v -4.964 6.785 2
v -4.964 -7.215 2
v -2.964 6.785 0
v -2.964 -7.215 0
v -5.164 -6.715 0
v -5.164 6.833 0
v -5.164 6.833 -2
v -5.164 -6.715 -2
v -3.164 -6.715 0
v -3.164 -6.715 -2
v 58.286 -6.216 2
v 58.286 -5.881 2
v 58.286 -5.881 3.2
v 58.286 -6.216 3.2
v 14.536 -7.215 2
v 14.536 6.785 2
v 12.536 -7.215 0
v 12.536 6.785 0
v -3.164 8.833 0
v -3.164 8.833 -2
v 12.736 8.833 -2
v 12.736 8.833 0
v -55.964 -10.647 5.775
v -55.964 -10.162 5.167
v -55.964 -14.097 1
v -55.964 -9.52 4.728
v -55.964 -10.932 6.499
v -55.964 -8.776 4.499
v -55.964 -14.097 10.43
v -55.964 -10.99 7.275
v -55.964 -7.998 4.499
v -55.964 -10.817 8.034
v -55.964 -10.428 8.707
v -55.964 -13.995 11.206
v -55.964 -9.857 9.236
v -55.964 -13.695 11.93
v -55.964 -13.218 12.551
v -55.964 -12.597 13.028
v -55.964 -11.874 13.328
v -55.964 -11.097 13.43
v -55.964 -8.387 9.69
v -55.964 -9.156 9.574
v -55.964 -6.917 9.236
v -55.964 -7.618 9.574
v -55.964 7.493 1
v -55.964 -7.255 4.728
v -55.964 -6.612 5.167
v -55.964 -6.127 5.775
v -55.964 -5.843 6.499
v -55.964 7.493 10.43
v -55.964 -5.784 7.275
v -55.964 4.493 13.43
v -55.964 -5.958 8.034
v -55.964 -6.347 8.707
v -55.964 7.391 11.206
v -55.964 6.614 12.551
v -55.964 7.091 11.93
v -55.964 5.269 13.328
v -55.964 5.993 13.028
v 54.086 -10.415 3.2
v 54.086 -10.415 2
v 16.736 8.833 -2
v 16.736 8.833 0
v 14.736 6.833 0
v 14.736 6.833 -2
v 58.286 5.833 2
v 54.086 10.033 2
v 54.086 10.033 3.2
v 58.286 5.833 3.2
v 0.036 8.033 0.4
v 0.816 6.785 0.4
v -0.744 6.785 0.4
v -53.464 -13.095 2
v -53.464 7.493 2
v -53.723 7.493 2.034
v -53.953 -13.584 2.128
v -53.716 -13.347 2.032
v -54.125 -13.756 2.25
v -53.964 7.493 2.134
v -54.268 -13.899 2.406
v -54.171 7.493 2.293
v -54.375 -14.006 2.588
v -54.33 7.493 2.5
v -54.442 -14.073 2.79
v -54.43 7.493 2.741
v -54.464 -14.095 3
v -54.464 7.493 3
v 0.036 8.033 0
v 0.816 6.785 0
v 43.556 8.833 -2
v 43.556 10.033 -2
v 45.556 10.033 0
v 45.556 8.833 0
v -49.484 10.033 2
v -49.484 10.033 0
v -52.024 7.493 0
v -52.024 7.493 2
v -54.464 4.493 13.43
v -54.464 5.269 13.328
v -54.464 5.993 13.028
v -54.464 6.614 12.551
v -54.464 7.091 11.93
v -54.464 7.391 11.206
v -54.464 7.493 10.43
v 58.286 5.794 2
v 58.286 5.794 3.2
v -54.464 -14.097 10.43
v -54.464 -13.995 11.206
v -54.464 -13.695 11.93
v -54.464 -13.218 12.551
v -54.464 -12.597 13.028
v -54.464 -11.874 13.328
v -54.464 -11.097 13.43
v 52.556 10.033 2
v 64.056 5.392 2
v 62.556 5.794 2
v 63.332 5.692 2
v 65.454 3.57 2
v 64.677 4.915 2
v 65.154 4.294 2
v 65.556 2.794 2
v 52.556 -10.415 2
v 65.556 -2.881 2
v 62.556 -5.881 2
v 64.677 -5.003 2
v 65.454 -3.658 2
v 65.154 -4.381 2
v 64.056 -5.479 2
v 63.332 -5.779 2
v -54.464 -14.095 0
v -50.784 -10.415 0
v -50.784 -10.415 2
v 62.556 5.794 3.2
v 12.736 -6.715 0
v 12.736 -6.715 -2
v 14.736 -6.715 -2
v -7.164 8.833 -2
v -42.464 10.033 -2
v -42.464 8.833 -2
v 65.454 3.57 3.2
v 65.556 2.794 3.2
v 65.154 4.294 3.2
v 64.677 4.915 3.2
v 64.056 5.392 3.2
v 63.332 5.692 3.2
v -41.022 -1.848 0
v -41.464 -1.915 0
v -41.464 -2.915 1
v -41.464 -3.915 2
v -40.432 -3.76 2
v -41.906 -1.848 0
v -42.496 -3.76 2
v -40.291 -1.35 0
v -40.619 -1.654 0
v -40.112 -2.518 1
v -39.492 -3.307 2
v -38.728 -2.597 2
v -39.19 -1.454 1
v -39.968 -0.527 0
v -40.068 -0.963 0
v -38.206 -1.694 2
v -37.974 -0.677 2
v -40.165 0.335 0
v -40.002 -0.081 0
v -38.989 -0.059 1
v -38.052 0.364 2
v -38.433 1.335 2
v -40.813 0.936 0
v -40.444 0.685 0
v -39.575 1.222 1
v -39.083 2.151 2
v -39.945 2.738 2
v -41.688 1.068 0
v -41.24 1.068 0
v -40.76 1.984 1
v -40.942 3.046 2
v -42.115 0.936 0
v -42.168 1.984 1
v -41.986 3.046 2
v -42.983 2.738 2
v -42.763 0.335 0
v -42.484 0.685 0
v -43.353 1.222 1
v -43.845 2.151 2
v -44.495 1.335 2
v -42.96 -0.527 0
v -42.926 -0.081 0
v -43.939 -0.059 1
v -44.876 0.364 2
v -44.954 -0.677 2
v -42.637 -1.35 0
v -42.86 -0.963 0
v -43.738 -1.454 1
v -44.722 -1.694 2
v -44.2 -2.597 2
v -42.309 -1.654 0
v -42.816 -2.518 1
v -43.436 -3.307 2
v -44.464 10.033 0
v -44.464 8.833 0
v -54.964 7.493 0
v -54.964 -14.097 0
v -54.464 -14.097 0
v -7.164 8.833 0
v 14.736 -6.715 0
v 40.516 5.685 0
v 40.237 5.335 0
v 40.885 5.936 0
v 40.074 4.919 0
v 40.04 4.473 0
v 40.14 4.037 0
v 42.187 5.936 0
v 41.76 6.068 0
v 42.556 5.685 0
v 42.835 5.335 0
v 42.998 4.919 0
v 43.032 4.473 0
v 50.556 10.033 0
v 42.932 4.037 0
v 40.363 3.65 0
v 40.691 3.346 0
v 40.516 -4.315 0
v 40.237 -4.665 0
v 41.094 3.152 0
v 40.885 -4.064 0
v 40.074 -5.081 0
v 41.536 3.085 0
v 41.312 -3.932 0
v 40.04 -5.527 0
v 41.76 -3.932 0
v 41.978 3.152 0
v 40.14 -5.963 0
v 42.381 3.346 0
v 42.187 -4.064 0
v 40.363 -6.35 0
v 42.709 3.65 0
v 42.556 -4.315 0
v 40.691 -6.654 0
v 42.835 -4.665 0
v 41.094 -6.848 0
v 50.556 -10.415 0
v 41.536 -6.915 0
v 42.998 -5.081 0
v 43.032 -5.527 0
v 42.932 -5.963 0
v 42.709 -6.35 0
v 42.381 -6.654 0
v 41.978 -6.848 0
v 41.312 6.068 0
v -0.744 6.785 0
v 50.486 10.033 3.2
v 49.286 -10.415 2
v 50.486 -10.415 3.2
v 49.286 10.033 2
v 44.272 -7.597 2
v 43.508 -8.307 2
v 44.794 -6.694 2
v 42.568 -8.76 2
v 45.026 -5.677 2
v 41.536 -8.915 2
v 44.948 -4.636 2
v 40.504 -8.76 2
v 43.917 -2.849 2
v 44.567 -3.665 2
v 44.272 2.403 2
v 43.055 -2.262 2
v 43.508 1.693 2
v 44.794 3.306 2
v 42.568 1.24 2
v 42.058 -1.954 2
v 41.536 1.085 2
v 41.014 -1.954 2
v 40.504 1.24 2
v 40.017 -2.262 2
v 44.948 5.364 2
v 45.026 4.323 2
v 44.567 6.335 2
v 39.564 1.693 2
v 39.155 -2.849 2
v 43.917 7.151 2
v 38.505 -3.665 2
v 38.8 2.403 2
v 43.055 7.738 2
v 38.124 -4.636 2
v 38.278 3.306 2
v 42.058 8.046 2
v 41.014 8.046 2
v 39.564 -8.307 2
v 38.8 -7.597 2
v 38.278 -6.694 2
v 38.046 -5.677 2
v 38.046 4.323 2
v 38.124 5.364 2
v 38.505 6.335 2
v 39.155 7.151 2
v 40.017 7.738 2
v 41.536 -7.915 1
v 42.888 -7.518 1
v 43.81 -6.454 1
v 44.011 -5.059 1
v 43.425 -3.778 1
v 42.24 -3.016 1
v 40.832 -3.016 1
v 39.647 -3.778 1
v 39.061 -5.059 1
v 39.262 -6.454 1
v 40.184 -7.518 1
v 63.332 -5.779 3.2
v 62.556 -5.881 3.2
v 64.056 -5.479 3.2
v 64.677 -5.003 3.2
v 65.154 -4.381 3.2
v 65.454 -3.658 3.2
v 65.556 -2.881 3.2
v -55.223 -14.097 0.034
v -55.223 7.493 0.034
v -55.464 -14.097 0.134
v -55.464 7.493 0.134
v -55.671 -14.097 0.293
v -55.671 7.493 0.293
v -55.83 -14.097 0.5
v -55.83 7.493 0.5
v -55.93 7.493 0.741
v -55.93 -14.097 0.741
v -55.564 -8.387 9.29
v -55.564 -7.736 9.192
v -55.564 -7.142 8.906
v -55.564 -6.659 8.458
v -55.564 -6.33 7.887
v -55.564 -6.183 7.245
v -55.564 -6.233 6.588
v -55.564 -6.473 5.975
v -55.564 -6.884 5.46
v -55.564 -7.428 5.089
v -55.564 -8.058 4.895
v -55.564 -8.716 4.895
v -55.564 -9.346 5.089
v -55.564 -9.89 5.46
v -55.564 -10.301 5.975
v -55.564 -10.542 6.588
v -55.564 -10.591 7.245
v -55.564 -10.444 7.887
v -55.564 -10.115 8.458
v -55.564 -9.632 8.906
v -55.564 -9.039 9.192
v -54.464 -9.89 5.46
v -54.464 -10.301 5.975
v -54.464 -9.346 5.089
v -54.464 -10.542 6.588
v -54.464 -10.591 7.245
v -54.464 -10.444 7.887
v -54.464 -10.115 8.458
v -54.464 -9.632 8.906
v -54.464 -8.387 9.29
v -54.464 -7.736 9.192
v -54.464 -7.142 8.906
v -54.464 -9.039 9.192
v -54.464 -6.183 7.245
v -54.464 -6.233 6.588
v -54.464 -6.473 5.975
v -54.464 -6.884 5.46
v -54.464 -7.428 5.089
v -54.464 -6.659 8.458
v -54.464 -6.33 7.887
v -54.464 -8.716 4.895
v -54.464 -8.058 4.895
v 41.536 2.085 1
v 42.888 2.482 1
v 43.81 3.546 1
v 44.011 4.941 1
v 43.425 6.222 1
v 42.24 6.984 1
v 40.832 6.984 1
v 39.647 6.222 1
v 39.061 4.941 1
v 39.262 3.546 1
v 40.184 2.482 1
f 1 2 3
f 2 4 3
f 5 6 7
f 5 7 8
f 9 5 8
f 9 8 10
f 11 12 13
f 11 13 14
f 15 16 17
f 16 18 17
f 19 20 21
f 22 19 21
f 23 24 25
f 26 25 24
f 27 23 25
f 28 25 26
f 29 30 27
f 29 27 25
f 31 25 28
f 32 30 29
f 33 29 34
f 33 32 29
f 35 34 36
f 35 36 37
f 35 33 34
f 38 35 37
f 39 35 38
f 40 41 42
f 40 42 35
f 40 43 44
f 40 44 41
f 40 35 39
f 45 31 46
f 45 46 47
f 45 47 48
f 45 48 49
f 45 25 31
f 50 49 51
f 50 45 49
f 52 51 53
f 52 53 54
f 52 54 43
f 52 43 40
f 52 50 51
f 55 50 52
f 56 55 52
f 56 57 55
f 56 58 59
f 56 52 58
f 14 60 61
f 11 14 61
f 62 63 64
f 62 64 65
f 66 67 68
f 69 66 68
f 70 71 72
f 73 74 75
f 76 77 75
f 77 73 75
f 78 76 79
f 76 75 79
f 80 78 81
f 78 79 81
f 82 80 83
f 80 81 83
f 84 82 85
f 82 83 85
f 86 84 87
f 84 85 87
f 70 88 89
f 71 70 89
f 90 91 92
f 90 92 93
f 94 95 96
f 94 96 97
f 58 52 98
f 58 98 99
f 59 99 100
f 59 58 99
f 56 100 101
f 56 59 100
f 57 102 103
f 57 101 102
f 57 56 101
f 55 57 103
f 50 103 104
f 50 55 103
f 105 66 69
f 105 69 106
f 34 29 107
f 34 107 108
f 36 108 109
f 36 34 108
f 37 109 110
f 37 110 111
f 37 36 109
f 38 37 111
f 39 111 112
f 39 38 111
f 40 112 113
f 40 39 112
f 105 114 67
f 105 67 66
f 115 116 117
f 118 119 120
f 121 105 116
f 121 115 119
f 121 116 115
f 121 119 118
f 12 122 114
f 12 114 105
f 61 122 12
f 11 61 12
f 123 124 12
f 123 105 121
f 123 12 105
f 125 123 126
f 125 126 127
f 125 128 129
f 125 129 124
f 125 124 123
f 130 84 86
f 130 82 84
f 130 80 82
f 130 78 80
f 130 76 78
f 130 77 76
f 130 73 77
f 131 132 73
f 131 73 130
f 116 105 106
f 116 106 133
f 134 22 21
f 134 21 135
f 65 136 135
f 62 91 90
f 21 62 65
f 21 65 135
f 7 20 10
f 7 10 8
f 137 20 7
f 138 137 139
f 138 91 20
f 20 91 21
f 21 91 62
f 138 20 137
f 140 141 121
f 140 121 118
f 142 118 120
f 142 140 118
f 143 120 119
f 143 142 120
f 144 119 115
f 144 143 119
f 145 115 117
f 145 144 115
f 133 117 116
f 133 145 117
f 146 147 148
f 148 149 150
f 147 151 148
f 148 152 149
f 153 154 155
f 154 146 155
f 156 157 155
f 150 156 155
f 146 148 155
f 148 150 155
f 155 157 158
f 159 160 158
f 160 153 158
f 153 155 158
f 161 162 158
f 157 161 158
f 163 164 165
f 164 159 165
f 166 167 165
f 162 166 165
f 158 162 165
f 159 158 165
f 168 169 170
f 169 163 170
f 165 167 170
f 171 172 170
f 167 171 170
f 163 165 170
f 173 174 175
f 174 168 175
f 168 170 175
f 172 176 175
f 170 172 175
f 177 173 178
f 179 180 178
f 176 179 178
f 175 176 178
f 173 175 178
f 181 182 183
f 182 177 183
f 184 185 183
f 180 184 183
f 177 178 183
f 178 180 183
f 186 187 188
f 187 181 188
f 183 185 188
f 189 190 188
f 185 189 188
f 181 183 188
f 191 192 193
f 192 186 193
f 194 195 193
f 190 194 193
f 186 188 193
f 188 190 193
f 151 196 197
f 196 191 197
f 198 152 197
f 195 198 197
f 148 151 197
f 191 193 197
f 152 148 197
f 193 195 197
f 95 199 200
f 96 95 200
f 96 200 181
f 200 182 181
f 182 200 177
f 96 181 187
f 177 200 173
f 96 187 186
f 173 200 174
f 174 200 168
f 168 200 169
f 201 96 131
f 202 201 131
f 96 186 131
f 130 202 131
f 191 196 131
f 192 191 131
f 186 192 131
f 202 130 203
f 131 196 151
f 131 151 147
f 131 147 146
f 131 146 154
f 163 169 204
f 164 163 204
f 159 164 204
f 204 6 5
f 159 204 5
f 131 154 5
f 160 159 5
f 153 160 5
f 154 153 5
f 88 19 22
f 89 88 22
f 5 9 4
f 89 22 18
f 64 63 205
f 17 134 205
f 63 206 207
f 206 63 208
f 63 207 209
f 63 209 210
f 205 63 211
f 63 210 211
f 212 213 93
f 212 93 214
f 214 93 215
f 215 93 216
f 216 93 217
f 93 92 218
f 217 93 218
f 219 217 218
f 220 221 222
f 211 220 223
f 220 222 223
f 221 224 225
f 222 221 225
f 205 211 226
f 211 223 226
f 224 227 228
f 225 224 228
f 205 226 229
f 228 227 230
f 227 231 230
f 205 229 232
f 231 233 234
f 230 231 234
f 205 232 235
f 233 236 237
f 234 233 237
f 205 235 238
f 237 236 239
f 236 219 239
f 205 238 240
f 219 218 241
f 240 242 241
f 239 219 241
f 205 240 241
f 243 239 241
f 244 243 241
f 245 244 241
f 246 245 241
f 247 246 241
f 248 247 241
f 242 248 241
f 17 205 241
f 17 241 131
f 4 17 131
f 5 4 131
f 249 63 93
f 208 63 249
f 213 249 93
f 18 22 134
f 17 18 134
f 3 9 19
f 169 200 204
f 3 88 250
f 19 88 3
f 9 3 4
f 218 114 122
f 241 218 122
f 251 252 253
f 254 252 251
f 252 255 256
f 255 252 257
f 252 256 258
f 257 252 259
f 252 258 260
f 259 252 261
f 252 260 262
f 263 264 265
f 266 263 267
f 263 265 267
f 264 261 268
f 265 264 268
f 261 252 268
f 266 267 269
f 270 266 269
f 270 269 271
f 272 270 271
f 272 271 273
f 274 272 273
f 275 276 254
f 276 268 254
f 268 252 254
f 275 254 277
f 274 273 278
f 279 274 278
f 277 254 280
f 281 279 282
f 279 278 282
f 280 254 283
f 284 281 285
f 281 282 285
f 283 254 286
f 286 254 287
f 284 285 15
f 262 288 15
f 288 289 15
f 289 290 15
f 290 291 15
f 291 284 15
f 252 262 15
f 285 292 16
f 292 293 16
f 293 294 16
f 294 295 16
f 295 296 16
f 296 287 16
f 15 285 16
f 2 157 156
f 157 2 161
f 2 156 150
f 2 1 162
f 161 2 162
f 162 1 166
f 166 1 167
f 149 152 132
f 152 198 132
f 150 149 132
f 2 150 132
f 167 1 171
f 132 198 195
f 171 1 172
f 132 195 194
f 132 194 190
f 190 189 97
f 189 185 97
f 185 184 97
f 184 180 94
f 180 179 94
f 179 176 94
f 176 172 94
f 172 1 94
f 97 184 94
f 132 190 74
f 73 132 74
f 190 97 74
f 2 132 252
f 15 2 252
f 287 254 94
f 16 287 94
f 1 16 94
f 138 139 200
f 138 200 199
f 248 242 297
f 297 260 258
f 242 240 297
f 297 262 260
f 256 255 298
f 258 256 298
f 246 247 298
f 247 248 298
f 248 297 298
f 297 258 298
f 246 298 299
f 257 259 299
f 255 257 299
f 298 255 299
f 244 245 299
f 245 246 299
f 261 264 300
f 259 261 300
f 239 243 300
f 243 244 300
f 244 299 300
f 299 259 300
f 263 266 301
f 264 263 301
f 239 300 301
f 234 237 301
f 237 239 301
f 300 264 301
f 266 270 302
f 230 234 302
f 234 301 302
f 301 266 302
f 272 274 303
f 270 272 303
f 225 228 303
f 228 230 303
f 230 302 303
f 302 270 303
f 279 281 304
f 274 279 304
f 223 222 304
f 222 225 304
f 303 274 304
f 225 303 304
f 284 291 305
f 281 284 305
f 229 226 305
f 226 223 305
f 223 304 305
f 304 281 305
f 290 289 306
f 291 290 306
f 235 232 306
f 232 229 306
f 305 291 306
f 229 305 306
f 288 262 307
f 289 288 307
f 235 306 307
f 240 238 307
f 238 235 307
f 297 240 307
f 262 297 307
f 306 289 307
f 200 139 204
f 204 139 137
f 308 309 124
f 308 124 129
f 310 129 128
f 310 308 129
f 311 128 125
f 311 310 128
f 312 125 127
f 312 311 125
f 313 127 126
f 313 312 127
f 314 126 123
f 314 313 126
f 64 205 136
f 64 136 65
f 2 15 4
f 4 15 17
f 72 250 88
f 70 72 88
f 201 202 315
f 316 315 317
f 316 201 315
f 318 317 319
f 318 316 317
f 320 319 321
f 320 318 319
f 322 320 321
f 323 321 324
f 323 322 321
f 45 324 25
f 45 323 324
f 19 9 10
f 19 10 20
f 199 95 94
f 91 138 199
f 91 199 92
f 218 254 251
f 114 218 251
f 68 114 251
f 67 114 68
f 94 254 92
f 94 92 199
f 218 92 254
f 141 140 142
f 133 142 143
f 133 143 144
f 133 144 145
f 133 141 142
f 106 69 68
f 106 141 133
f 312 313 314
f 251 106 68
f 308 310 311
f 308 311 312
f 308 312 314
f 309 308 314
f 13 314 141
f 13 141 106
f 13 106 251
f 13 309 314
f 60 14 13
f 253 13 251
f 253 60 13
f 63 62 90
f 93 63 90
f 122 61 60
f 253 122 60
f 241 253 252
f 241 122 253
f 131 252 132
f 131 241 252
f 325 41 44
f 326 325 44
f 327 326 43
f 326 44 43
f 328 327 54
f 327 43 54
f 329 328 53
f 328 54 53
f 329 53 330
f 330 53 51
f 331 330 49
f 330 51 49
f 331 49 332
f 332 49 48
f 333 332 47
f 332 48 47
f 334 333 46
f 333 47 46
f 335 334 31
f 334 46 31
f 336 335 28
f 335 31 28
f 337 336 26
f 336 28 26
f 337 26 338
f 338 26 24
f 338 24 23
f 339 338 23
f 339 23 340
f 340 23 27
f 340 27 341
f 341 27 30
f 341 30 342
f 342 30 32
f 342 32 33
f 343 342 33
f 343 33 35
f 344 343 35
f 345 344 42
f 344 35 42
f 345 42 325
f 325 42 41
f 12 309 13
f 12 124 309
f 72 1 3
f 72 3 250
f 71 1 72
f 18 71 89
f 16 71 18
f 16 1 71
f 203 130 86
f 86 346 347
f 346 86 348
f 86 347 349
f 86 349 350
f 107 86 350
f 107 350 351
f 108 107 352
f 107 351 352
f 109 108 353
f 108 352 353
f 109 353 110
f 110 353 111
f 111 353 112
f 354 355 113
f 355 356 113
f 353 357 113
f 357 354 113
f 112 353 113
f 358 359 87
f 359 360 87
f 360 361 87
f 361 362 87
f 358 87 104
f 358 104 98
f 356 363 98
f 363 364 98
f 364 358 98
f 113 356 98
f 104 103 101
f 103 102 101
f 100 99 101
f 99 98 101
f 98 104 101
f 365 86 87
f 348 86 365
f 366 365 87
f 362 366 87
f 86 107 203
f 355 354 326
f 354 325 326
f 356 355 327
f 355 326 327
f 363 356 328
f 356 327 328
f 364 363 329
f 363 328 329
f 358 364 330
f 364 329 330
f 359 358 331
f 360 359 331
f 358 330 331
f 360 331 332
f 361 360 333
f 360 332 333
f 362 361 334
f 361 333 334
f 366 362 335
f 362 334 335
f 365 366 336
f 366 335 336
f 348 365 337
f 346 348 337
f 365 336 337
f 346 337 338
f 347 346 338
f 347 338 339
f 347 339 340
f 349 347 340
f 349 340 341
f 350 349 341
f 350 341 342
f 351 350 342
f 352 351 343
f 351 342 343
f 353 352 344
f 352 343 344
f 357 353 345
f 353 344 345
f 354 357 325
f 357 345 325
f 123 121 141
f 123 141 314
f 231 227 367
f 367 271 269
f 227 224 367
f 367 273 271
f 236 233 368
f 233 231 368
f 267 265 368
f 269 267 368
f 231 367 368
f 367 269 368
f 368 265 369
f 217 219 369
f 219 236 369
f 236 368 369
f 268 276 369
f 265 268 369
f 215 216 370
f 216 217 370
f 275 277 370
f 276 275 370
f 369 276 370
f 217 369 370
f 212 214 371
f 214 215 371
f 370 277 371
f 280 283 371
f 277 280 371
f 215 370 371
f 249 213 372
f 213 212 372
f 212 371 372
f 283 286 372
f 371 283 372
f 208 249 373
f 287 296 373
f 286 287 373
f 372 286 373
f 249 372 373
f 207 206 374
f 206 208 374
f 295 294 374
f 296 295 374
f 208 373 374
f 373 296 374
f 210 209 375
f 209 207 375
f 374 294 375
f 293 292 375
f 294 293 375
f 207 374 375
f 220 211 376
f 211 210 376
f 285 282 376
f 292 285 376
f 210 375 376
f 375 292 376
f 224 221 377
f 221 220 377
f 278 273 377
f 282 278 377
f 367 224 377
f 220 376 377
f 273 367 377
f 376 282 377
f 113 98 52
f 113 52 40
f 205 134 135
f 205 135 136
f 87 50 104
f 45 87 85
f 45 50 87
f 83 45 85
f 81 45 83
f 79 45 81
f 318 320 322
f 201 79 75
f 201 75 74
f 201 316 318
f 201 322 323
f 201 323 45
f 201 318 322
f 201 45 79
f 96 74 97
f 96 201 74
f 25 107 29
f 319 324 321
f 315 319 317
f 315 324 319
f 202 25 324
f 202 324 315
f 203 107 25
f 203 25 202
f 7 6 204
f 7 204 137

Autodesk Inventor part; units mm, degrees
ref_plane "YZ Plane" through (0, 0, 0) normal (1, 0, 0) x (0, 1, 0)
ref_plane "XZ Plane" through (0, 0, 0) normal (0, 1, 0) x (-1, 0, 0)
ref_plane "XY Plane" through (0, 0, 0) normal (0, 0, 1) x (1, 0, 0)
sketch "Sketch1" plane through (0, 0, 0) normal (0, 0, 1) x (1, 0, 0)
  line L0 (-54.464, 10.0328) -> (58.286, 10.0328)
  line L1 (58.286, 10.0328) -> (58.286, -10.415)
  line L2 (58.286, -10.415) -> (-54.464, -10.415)
  line L3 (-54.464, -10.415) -> (-54.464, 10.0328)
  line L4 (58.286, 5.794) -> (65.556, 5.794)
  line L5 (65.556, 5.794) -> (65.556, -5.8813)
  line L6 (65.556, -5.8813) -> (58.286, -5.8813)
  line L7 (58.286, -5.8813) -> (58.286, 5.794)
  point P0 (0, 0)
  dimension "d0" = 112.75
  dimension "d1" = 120.02
extrude "Extrusion1" add sketch "Sketch1" along normal blind 2
chamfer "Chamfer1" distance 4.2 angle 45 2 edges at (58.286, 10.0328, 1) (58.286, -10.415, 1)
fillet "Fillet1" radius 2 2 edges at (65.556, 5.794, 1) (65.556, -5.8813, 1)
sketch "Sketch3" plane through (-54.464, -10.415, 0) normal (-1, 0, 0) x (0, 0, 1)
  line L0 (0, 20.4479) -> (0, 0) projected
  line L1 (0, 17.9079) -> (13.43, 17.9079)
  line L2 (13.43, 17.9079) -> (13.43, -3.6821)
  line L3 (13.43, -3.6821) -> (0, -3.6821)
  line L4 (0, -3.6821) -> (0, 17.9079)
  line L5 (0, 20.4479) -> (2, 20.4479) projected
  line L6 (2, 20.4479) -> (2, 0) projected
  point P0 (0, 10.415)
  dimension "d14" = 2.54
  dimension "d15" = 21.59
  dimension "d16" = 11.43
extrude "Extrusion3" add sketch "Sketch3" along normal blind 1.5 contours L1 L2 L3 L4 L0
sketch "Sketch4" plane through (0, 0, 0) normal (0, 0, -1) x (-1, 0, 0)
  line L0 (55.964, -14.0972) -> (55.964, 7.4928) projected
  line L1 (-54.086, 10.0328) -> (54.464, 10.0328) projected
  line L2 (55.964, 7.4928) -> (52.024, 7.4928)
  line L3 (52.024, 7.4928) -> (52.024, 10.0328)
  line L4 (52.024, 10.0328) -> (55.964, 10.0328)
  line L5 (55.964, 10.0328) -> (55.964, 7.4928)
  point P0 (0, 0)
  point P1 (-30.556, 10.0328)
  dimension "d19" = 3.94
extrude "Extrusion4" cut sketch "Sketch4" against normal blind 20
chamfer "Chamfer3" distance 2.54 angle 45 1 edges at (-52.024, 10.0328, 1)
chamfer "Chamfer4" distance 3.68 angle 45 1 edges at (-54.464, -10.415, 1)
fillet "Fillet2" radius 3 2 edges at (-55.214, 7.4928, 13.43) (-55.214, -14.0972, 13.43)
sketch "Sketch5" plane through (-55.964, -10.415, 0) normal (-1, 0, 0) x (0, 0, 1)
  circle A0 centre (7.08, 2.0279) radius 2.21
  line L0 (0, -3.6821) -> (10.43, -3.6821) projected
  line L1 (9.29, 2.0279) -> (4.87, 2.0279)
  line L2 (4.87, 2.0279) -> (4.87, -3.6821)
  line L3 (4.87, -3.6821) -> (9.29, -3.6821)
  line L4 (9.29, -3.6821) -> (9.29, 2.0279)
  line L5 (2, 20.4479) -> (0, 20.4479) projected
  line L6 (2, 17.9079) -> (2, 20.4479) projected
  point P0 (0, 10.415)
  point P1 (7.08, 2.0279)
  point P2 (9.29, -3.6821)
  point P3 (4.87, 2.0279)
  dimension "d29" = 4.42
  dimension "d30" = 18.42
  dimension "d31" = 5.08
  dimension "d32" = 5.08
  dimension "d33" = 4.42
extrude "Extrusion5" cut sketch "Sketch5" against normal blind 2
fillet "Fillet3" radius 1 1 edges at (-54.464, -3.3011, 2)
fillet "Fillet4" radius 1 1 edges at (-55.964, -3.3022, 0)
sketch "Sketch13" plane through (0, 0, 0) normal (0, 0, -1) x (-1, 0, 0)
  line L0 (-1.036, 6.4328) -> (0.964, 6.4328)
  line L1 (0.964, 6.4328) -> (-0.036, 8.0328)
  line L2 (-0.036, 8.0328) -> (-1.036, 6.4328)
  line L3 (-54.086, 10.0328) -> (49.484, 10.0328) projected
  line L4 (54.964, 7.4928) -> (54.964, -14.0972) projected
  point P0 (0, 0)
  point P1 (-30.556, 10.0328)
  dimension "d84" = 2
  dimension "d85" = 1.6
  dimension "d86" = 1
  dimension "d87" = 2
  dimension "d88" = 55
extrude "Extrusion12" cut sketch "Sketch13" against normal blind 0.4
sketch "Sketch14" plane through (0, 0, 2) normal (0, 0, 1) x (1, 0, 0)
  line L0 (-54.464, -11.0972) -> (-54.464, 4.4928) projected
  line L1 (-50.784, -10.415) -> (54.086, -10.415) projected
  line L2 (54.086, 10.0328) -> (-49.484, 10.0328) projected
  point P0 (0, 0)
  point P1 (-41.464, -0.415)
  point P2 (41.536, -5.415)
  point P3 (41.536, 4.585)
  dimension "d91" = 13
  dimension "d92" = 10
  dimension "d93" = 96
  dimension "d94" = 96
  dimension "d95" = 15
  dimension "d96" = 5
  dimension "d97" = 5.4479
hole "Hole2" at (-41.464, -0.415, 2) at (41.536, -5.415, 2) at (41.536, 4.585, 2) direction (0, 0, -1) diameter 3 depth 5 tip angle 118 countersink diameter 7 countersink angle 90
sketch "Sketch17" plane through (-49.484, 10.0328, 0) normal (0, 1, 0) x (1, 0, 0)
  line L0 (103.57, -2) -> (0, -2) projected
  line L1 (5.02, -2) -> (100.04, -2)
  line L2 (100.04, -2) -> (100.04, 2)
  line L3 (100.04, 2) -> (5.02, 2)
  line L4 (5.02, 2) -> (5.02, -2)
  line L5 (-4.98, -10.43) -> (-4.98, -3) projected
  line L6 (115.04, -2) -> (115.04, 0) projected
  point P0 (49.484, 0)
  dimension "d114" = 4
  dimension "d115" = 10
  dimension "d116" = 15
extrude "Extrusion14" add sketch "Sketch17" against normal blind 1.2
chamfer "Chamfer8" distance 2 angle 45 2 edges at (-44.464, 9.4328, -2) (50.556, 9.4328, -2)
sketch "Sketch18" plane through (0, 0, 2) normal (0, 0, 1) x (1, 0, 0)
  line L0 (-2.964, 6.785) -> (12.536, 6.785)
  line L1 (12.536, 6.785) -> (12.536, -7.215)
  line L2 (12.536, -7.215) -> (-2.964, -7.215)
  line L3 (-2.964, -7.215) -> (-2.964, 6.785)
  circle A0 centre (41.536, 4.585) radius 1.5 projected
  line L4 (-50.784, -10.415) -> (54.086, -10.415) projected
  point P0 (0, 0)
  dimension "d122" = 29
  dimension "d123" = 44.5
  dimension "d124" = 3.2
  dimension "d125" = 14
extrude "Extrusion15" cut sketch "Sketch18" against normal blind 2 contours L0 L1 L2 L3
sketch "Sketch20" plane through (0, 0, 2) normal (0, 0, 1) x (1, 0, 0)
  line L0 (65.556, -5.8813) -> (58.286, -5.8813)
  line L1 (58.286, -5.8813) -> (58.286, 5.794)
  line L2 (58.286, 5.794) -> (65.556, 5.794)
  line L3 (65.556, 5.794) -> (65.556, -5.8813)
  line L4 (58.286, -10.415) -> (51.286, -10.415)
  line L5 (51.286, -10.415) -> (51.286, 10.0328)
  line L6 (51.286, 10.0328) -> (58.286, 10.0328)
  line L7 (58.286, 10.0328) -> (58.286, -10.415)
  line L8 (65.556, -3.8813) -> (65.556, 3.794) projected
  line L9 (58.286, -5.8813) -> (63.556, -5.8813) projected
  line L10 (63.556, 5.794) -> (58.286, 5.794) projected
  line L11 (54.086, 10.0328) -> (-49.484, 10.0328) projected
  line L12 (-50.784, -10.415) -> (54.086, -10.415) projected
  line L13 (58.286, -6.215) -> (58.286, -5.8813) projected
  point P0 (0, 0)
  dimension "d136" = 7
extrude "Extrusion17" add sketch "Sketch20" along normal blind 2
chamfer "Chamfer11" distance 4.2 angle 45 2 edges at (58.286, -10.415, 3) (58.286, 10.0328, 3)
chamfer "Chamfer12" distance 2 angle 45 1 edges at (51.286, -0.1911, 2)
sketch "Sketch21" plane through (-50.784, -10.415, 0) normal (0, -1, 0) x (1, 0, 0)
  line L0 (116.34, 0) -> (114.34, 0) projected
  line L1 (116.34, 0) -> (103.34, 0)
  line L2 (103.34, 0) -> (103.34, 2)
  line L3 (103.34, 2) -> (116.34, 2)
  line L4 (116.34, 2) -> (116.34, 0)
  line L5 (114.34, 2) -> (116.34, 2) projected
  line L6 (104.87, 0) -> (101.34, 0) projected
  point P0 (50.784, 0)
  dimension "d145" = 2
extrude "Extrusion18" cut sketch "Sketch21" against normal blind 200
chamfer "Chamfer13" distance 2 angle 45 1 edges at (52.556, -0.1911, 0)
fillet "Fillet10" radius 3 2 edges at (65.556, -5.8813, 3) (65.556, 5.794, 3)
sketch "Sketch22" plane through (-50.784, -10.415, 0) normal (0, -1, 0) x (1, 0, 0)
  line L0 (101.14, 4) -> (116.34, 4)
  line L1 (116.34, 4) -> (116.34, 3.2)
  line L2 (116.34, 3.2) -> (101.14, 3.2)
  line L3 (101.14, 3.2) -> (101.14, 4)
  line L4 (102.07, 4) -> (104.87, 4) projected
  line L5 (116.34, 2) -> (116.34, 4) projected
  point P0 (50.784, 0)
  dimension "d152" = 15.2
  dimension "d153" = 0.8
extrude "Extrusion19" cut sketch "Sketch22" against normal blind 200
sketch "Sketch23" plane through (-49.484, 8.8328, 0) normal (0, -1, 0) x (1, 0, 0)
  line L0 (5.02, 0) -> (100.04, 0) projected
  line L1 (7.02, -2) -> (98.04, -2) projected
  line L2 (100.04, 0) -> (95.04, 0)
  line L3 (95.04, 0) -> (95.04, -2)
  line L4 (95.04, -2) -> (100.04, -2)
  line L5 (100.04, -2) -> (100.04, 0)
  point P0 (49.484, 0)
  dimension "d156" = 5
extrude "Extrusion20" cut sketch "Sketch23" against normal blind 10
chamfer "Chamfer14" distance 2 angle 45 1 edges at (45.556, 9.4328, -2)
sketch "Sketch24" plane through (-55.964, -10.415, 0) normal (-1, 0, 0) x (0, 0, 1)
  arc A0 (9.29, 2.0279) -> (4.87, 2.0279) centre (7.08, 2.0279) ccw projected
  circle A1 centre (7.08, 2.0279) radius 2.21
  line L0 (4.87, -3.6821) -> (4.87, 2.0279) projected
  line L1 (9.29, 2.0279) -> (9.29, -3.6821) projected
  line L2 (4.87, -3.6821) -> (9.29, -3.6821)
  line L3 (9.29, -3.6821) -> (9.29, -0.6821)
  line L4 (9.29, -0.6821) -> (4.87, -0.6821)
  line L5 (4.87, -0.6821) -> (4.87, -3.6821)
  point P0 (0, 10.415)
  point P1 (9.29, 2.0279)
  point P2 (4.87, 2.0279)
  dimension "d162" = 3
extrude "Extrusion21" add sketch "Sketch24" against normal blind 1.5 contours L1 L4 L0 A1 | L1 L2 L0 L4
chamfer "Chamfer15" distance 0.4 angle 45 1 edges at (-55.964, -8.3872, 4.87)
chamfer "Chamfer16" distance 2 angle 45 2 edges at (12.536, -0.215, 2) (-2.964, -0.215, 2)
sketch "Sketch26" plane through (0, 0, 0) normal (0, 0, -1) x (-1, 0, 0)
  line L0 (44.464, 8.8328) -> (-45.556, 8.8328) projected
  line L1 (-14.736, 8.8328) -> (-12.736, 8.8328)
  line L2 (-12.736, 8.8328) -> (-12.736, -6.715)
  line L3 (-12.736, -6.715) -> (-14.736, -6.715)
  line L4 (-14.736, -6.715) -> (-14.736, 8.8328)
  line L5 (3.164, 8.8328) -> (5.164, 8.8328)
  line L6 (5.164, 8.8328) -> (5.164, -6.715)
  line L7 (5.164, -6.715) -> (3.164, -6.715)
  line L8 (3.164, -6.715) -> (3.164, 8.8328)
  line L9 (-12.536, -7.215) -> (-12.536, 6.785) projected
  line L10 (2.964, 6.785) -> (2.964, -7.215) projected
  line L11 (2.964, -7.215) -> (-12.536, -7.215) projected
  point P0 (0, 0)
  dimension "d175" = 0.2
  dimension "d176" = 0.2
  dimension "d177" = 2
  dimension "d178" = 2
  dimension "d179" = 0.5
  dimension "d180" = 0.5
extrude "Extrusion23" add sketch "Sketch26" along normal blind 2
chamfer "Chamfer17" distance 2 angle 45 2 edges at (14.736, 8.8328, -1) (-5.164, 8.8328, -1)
properties part number "pcie-bracket"
